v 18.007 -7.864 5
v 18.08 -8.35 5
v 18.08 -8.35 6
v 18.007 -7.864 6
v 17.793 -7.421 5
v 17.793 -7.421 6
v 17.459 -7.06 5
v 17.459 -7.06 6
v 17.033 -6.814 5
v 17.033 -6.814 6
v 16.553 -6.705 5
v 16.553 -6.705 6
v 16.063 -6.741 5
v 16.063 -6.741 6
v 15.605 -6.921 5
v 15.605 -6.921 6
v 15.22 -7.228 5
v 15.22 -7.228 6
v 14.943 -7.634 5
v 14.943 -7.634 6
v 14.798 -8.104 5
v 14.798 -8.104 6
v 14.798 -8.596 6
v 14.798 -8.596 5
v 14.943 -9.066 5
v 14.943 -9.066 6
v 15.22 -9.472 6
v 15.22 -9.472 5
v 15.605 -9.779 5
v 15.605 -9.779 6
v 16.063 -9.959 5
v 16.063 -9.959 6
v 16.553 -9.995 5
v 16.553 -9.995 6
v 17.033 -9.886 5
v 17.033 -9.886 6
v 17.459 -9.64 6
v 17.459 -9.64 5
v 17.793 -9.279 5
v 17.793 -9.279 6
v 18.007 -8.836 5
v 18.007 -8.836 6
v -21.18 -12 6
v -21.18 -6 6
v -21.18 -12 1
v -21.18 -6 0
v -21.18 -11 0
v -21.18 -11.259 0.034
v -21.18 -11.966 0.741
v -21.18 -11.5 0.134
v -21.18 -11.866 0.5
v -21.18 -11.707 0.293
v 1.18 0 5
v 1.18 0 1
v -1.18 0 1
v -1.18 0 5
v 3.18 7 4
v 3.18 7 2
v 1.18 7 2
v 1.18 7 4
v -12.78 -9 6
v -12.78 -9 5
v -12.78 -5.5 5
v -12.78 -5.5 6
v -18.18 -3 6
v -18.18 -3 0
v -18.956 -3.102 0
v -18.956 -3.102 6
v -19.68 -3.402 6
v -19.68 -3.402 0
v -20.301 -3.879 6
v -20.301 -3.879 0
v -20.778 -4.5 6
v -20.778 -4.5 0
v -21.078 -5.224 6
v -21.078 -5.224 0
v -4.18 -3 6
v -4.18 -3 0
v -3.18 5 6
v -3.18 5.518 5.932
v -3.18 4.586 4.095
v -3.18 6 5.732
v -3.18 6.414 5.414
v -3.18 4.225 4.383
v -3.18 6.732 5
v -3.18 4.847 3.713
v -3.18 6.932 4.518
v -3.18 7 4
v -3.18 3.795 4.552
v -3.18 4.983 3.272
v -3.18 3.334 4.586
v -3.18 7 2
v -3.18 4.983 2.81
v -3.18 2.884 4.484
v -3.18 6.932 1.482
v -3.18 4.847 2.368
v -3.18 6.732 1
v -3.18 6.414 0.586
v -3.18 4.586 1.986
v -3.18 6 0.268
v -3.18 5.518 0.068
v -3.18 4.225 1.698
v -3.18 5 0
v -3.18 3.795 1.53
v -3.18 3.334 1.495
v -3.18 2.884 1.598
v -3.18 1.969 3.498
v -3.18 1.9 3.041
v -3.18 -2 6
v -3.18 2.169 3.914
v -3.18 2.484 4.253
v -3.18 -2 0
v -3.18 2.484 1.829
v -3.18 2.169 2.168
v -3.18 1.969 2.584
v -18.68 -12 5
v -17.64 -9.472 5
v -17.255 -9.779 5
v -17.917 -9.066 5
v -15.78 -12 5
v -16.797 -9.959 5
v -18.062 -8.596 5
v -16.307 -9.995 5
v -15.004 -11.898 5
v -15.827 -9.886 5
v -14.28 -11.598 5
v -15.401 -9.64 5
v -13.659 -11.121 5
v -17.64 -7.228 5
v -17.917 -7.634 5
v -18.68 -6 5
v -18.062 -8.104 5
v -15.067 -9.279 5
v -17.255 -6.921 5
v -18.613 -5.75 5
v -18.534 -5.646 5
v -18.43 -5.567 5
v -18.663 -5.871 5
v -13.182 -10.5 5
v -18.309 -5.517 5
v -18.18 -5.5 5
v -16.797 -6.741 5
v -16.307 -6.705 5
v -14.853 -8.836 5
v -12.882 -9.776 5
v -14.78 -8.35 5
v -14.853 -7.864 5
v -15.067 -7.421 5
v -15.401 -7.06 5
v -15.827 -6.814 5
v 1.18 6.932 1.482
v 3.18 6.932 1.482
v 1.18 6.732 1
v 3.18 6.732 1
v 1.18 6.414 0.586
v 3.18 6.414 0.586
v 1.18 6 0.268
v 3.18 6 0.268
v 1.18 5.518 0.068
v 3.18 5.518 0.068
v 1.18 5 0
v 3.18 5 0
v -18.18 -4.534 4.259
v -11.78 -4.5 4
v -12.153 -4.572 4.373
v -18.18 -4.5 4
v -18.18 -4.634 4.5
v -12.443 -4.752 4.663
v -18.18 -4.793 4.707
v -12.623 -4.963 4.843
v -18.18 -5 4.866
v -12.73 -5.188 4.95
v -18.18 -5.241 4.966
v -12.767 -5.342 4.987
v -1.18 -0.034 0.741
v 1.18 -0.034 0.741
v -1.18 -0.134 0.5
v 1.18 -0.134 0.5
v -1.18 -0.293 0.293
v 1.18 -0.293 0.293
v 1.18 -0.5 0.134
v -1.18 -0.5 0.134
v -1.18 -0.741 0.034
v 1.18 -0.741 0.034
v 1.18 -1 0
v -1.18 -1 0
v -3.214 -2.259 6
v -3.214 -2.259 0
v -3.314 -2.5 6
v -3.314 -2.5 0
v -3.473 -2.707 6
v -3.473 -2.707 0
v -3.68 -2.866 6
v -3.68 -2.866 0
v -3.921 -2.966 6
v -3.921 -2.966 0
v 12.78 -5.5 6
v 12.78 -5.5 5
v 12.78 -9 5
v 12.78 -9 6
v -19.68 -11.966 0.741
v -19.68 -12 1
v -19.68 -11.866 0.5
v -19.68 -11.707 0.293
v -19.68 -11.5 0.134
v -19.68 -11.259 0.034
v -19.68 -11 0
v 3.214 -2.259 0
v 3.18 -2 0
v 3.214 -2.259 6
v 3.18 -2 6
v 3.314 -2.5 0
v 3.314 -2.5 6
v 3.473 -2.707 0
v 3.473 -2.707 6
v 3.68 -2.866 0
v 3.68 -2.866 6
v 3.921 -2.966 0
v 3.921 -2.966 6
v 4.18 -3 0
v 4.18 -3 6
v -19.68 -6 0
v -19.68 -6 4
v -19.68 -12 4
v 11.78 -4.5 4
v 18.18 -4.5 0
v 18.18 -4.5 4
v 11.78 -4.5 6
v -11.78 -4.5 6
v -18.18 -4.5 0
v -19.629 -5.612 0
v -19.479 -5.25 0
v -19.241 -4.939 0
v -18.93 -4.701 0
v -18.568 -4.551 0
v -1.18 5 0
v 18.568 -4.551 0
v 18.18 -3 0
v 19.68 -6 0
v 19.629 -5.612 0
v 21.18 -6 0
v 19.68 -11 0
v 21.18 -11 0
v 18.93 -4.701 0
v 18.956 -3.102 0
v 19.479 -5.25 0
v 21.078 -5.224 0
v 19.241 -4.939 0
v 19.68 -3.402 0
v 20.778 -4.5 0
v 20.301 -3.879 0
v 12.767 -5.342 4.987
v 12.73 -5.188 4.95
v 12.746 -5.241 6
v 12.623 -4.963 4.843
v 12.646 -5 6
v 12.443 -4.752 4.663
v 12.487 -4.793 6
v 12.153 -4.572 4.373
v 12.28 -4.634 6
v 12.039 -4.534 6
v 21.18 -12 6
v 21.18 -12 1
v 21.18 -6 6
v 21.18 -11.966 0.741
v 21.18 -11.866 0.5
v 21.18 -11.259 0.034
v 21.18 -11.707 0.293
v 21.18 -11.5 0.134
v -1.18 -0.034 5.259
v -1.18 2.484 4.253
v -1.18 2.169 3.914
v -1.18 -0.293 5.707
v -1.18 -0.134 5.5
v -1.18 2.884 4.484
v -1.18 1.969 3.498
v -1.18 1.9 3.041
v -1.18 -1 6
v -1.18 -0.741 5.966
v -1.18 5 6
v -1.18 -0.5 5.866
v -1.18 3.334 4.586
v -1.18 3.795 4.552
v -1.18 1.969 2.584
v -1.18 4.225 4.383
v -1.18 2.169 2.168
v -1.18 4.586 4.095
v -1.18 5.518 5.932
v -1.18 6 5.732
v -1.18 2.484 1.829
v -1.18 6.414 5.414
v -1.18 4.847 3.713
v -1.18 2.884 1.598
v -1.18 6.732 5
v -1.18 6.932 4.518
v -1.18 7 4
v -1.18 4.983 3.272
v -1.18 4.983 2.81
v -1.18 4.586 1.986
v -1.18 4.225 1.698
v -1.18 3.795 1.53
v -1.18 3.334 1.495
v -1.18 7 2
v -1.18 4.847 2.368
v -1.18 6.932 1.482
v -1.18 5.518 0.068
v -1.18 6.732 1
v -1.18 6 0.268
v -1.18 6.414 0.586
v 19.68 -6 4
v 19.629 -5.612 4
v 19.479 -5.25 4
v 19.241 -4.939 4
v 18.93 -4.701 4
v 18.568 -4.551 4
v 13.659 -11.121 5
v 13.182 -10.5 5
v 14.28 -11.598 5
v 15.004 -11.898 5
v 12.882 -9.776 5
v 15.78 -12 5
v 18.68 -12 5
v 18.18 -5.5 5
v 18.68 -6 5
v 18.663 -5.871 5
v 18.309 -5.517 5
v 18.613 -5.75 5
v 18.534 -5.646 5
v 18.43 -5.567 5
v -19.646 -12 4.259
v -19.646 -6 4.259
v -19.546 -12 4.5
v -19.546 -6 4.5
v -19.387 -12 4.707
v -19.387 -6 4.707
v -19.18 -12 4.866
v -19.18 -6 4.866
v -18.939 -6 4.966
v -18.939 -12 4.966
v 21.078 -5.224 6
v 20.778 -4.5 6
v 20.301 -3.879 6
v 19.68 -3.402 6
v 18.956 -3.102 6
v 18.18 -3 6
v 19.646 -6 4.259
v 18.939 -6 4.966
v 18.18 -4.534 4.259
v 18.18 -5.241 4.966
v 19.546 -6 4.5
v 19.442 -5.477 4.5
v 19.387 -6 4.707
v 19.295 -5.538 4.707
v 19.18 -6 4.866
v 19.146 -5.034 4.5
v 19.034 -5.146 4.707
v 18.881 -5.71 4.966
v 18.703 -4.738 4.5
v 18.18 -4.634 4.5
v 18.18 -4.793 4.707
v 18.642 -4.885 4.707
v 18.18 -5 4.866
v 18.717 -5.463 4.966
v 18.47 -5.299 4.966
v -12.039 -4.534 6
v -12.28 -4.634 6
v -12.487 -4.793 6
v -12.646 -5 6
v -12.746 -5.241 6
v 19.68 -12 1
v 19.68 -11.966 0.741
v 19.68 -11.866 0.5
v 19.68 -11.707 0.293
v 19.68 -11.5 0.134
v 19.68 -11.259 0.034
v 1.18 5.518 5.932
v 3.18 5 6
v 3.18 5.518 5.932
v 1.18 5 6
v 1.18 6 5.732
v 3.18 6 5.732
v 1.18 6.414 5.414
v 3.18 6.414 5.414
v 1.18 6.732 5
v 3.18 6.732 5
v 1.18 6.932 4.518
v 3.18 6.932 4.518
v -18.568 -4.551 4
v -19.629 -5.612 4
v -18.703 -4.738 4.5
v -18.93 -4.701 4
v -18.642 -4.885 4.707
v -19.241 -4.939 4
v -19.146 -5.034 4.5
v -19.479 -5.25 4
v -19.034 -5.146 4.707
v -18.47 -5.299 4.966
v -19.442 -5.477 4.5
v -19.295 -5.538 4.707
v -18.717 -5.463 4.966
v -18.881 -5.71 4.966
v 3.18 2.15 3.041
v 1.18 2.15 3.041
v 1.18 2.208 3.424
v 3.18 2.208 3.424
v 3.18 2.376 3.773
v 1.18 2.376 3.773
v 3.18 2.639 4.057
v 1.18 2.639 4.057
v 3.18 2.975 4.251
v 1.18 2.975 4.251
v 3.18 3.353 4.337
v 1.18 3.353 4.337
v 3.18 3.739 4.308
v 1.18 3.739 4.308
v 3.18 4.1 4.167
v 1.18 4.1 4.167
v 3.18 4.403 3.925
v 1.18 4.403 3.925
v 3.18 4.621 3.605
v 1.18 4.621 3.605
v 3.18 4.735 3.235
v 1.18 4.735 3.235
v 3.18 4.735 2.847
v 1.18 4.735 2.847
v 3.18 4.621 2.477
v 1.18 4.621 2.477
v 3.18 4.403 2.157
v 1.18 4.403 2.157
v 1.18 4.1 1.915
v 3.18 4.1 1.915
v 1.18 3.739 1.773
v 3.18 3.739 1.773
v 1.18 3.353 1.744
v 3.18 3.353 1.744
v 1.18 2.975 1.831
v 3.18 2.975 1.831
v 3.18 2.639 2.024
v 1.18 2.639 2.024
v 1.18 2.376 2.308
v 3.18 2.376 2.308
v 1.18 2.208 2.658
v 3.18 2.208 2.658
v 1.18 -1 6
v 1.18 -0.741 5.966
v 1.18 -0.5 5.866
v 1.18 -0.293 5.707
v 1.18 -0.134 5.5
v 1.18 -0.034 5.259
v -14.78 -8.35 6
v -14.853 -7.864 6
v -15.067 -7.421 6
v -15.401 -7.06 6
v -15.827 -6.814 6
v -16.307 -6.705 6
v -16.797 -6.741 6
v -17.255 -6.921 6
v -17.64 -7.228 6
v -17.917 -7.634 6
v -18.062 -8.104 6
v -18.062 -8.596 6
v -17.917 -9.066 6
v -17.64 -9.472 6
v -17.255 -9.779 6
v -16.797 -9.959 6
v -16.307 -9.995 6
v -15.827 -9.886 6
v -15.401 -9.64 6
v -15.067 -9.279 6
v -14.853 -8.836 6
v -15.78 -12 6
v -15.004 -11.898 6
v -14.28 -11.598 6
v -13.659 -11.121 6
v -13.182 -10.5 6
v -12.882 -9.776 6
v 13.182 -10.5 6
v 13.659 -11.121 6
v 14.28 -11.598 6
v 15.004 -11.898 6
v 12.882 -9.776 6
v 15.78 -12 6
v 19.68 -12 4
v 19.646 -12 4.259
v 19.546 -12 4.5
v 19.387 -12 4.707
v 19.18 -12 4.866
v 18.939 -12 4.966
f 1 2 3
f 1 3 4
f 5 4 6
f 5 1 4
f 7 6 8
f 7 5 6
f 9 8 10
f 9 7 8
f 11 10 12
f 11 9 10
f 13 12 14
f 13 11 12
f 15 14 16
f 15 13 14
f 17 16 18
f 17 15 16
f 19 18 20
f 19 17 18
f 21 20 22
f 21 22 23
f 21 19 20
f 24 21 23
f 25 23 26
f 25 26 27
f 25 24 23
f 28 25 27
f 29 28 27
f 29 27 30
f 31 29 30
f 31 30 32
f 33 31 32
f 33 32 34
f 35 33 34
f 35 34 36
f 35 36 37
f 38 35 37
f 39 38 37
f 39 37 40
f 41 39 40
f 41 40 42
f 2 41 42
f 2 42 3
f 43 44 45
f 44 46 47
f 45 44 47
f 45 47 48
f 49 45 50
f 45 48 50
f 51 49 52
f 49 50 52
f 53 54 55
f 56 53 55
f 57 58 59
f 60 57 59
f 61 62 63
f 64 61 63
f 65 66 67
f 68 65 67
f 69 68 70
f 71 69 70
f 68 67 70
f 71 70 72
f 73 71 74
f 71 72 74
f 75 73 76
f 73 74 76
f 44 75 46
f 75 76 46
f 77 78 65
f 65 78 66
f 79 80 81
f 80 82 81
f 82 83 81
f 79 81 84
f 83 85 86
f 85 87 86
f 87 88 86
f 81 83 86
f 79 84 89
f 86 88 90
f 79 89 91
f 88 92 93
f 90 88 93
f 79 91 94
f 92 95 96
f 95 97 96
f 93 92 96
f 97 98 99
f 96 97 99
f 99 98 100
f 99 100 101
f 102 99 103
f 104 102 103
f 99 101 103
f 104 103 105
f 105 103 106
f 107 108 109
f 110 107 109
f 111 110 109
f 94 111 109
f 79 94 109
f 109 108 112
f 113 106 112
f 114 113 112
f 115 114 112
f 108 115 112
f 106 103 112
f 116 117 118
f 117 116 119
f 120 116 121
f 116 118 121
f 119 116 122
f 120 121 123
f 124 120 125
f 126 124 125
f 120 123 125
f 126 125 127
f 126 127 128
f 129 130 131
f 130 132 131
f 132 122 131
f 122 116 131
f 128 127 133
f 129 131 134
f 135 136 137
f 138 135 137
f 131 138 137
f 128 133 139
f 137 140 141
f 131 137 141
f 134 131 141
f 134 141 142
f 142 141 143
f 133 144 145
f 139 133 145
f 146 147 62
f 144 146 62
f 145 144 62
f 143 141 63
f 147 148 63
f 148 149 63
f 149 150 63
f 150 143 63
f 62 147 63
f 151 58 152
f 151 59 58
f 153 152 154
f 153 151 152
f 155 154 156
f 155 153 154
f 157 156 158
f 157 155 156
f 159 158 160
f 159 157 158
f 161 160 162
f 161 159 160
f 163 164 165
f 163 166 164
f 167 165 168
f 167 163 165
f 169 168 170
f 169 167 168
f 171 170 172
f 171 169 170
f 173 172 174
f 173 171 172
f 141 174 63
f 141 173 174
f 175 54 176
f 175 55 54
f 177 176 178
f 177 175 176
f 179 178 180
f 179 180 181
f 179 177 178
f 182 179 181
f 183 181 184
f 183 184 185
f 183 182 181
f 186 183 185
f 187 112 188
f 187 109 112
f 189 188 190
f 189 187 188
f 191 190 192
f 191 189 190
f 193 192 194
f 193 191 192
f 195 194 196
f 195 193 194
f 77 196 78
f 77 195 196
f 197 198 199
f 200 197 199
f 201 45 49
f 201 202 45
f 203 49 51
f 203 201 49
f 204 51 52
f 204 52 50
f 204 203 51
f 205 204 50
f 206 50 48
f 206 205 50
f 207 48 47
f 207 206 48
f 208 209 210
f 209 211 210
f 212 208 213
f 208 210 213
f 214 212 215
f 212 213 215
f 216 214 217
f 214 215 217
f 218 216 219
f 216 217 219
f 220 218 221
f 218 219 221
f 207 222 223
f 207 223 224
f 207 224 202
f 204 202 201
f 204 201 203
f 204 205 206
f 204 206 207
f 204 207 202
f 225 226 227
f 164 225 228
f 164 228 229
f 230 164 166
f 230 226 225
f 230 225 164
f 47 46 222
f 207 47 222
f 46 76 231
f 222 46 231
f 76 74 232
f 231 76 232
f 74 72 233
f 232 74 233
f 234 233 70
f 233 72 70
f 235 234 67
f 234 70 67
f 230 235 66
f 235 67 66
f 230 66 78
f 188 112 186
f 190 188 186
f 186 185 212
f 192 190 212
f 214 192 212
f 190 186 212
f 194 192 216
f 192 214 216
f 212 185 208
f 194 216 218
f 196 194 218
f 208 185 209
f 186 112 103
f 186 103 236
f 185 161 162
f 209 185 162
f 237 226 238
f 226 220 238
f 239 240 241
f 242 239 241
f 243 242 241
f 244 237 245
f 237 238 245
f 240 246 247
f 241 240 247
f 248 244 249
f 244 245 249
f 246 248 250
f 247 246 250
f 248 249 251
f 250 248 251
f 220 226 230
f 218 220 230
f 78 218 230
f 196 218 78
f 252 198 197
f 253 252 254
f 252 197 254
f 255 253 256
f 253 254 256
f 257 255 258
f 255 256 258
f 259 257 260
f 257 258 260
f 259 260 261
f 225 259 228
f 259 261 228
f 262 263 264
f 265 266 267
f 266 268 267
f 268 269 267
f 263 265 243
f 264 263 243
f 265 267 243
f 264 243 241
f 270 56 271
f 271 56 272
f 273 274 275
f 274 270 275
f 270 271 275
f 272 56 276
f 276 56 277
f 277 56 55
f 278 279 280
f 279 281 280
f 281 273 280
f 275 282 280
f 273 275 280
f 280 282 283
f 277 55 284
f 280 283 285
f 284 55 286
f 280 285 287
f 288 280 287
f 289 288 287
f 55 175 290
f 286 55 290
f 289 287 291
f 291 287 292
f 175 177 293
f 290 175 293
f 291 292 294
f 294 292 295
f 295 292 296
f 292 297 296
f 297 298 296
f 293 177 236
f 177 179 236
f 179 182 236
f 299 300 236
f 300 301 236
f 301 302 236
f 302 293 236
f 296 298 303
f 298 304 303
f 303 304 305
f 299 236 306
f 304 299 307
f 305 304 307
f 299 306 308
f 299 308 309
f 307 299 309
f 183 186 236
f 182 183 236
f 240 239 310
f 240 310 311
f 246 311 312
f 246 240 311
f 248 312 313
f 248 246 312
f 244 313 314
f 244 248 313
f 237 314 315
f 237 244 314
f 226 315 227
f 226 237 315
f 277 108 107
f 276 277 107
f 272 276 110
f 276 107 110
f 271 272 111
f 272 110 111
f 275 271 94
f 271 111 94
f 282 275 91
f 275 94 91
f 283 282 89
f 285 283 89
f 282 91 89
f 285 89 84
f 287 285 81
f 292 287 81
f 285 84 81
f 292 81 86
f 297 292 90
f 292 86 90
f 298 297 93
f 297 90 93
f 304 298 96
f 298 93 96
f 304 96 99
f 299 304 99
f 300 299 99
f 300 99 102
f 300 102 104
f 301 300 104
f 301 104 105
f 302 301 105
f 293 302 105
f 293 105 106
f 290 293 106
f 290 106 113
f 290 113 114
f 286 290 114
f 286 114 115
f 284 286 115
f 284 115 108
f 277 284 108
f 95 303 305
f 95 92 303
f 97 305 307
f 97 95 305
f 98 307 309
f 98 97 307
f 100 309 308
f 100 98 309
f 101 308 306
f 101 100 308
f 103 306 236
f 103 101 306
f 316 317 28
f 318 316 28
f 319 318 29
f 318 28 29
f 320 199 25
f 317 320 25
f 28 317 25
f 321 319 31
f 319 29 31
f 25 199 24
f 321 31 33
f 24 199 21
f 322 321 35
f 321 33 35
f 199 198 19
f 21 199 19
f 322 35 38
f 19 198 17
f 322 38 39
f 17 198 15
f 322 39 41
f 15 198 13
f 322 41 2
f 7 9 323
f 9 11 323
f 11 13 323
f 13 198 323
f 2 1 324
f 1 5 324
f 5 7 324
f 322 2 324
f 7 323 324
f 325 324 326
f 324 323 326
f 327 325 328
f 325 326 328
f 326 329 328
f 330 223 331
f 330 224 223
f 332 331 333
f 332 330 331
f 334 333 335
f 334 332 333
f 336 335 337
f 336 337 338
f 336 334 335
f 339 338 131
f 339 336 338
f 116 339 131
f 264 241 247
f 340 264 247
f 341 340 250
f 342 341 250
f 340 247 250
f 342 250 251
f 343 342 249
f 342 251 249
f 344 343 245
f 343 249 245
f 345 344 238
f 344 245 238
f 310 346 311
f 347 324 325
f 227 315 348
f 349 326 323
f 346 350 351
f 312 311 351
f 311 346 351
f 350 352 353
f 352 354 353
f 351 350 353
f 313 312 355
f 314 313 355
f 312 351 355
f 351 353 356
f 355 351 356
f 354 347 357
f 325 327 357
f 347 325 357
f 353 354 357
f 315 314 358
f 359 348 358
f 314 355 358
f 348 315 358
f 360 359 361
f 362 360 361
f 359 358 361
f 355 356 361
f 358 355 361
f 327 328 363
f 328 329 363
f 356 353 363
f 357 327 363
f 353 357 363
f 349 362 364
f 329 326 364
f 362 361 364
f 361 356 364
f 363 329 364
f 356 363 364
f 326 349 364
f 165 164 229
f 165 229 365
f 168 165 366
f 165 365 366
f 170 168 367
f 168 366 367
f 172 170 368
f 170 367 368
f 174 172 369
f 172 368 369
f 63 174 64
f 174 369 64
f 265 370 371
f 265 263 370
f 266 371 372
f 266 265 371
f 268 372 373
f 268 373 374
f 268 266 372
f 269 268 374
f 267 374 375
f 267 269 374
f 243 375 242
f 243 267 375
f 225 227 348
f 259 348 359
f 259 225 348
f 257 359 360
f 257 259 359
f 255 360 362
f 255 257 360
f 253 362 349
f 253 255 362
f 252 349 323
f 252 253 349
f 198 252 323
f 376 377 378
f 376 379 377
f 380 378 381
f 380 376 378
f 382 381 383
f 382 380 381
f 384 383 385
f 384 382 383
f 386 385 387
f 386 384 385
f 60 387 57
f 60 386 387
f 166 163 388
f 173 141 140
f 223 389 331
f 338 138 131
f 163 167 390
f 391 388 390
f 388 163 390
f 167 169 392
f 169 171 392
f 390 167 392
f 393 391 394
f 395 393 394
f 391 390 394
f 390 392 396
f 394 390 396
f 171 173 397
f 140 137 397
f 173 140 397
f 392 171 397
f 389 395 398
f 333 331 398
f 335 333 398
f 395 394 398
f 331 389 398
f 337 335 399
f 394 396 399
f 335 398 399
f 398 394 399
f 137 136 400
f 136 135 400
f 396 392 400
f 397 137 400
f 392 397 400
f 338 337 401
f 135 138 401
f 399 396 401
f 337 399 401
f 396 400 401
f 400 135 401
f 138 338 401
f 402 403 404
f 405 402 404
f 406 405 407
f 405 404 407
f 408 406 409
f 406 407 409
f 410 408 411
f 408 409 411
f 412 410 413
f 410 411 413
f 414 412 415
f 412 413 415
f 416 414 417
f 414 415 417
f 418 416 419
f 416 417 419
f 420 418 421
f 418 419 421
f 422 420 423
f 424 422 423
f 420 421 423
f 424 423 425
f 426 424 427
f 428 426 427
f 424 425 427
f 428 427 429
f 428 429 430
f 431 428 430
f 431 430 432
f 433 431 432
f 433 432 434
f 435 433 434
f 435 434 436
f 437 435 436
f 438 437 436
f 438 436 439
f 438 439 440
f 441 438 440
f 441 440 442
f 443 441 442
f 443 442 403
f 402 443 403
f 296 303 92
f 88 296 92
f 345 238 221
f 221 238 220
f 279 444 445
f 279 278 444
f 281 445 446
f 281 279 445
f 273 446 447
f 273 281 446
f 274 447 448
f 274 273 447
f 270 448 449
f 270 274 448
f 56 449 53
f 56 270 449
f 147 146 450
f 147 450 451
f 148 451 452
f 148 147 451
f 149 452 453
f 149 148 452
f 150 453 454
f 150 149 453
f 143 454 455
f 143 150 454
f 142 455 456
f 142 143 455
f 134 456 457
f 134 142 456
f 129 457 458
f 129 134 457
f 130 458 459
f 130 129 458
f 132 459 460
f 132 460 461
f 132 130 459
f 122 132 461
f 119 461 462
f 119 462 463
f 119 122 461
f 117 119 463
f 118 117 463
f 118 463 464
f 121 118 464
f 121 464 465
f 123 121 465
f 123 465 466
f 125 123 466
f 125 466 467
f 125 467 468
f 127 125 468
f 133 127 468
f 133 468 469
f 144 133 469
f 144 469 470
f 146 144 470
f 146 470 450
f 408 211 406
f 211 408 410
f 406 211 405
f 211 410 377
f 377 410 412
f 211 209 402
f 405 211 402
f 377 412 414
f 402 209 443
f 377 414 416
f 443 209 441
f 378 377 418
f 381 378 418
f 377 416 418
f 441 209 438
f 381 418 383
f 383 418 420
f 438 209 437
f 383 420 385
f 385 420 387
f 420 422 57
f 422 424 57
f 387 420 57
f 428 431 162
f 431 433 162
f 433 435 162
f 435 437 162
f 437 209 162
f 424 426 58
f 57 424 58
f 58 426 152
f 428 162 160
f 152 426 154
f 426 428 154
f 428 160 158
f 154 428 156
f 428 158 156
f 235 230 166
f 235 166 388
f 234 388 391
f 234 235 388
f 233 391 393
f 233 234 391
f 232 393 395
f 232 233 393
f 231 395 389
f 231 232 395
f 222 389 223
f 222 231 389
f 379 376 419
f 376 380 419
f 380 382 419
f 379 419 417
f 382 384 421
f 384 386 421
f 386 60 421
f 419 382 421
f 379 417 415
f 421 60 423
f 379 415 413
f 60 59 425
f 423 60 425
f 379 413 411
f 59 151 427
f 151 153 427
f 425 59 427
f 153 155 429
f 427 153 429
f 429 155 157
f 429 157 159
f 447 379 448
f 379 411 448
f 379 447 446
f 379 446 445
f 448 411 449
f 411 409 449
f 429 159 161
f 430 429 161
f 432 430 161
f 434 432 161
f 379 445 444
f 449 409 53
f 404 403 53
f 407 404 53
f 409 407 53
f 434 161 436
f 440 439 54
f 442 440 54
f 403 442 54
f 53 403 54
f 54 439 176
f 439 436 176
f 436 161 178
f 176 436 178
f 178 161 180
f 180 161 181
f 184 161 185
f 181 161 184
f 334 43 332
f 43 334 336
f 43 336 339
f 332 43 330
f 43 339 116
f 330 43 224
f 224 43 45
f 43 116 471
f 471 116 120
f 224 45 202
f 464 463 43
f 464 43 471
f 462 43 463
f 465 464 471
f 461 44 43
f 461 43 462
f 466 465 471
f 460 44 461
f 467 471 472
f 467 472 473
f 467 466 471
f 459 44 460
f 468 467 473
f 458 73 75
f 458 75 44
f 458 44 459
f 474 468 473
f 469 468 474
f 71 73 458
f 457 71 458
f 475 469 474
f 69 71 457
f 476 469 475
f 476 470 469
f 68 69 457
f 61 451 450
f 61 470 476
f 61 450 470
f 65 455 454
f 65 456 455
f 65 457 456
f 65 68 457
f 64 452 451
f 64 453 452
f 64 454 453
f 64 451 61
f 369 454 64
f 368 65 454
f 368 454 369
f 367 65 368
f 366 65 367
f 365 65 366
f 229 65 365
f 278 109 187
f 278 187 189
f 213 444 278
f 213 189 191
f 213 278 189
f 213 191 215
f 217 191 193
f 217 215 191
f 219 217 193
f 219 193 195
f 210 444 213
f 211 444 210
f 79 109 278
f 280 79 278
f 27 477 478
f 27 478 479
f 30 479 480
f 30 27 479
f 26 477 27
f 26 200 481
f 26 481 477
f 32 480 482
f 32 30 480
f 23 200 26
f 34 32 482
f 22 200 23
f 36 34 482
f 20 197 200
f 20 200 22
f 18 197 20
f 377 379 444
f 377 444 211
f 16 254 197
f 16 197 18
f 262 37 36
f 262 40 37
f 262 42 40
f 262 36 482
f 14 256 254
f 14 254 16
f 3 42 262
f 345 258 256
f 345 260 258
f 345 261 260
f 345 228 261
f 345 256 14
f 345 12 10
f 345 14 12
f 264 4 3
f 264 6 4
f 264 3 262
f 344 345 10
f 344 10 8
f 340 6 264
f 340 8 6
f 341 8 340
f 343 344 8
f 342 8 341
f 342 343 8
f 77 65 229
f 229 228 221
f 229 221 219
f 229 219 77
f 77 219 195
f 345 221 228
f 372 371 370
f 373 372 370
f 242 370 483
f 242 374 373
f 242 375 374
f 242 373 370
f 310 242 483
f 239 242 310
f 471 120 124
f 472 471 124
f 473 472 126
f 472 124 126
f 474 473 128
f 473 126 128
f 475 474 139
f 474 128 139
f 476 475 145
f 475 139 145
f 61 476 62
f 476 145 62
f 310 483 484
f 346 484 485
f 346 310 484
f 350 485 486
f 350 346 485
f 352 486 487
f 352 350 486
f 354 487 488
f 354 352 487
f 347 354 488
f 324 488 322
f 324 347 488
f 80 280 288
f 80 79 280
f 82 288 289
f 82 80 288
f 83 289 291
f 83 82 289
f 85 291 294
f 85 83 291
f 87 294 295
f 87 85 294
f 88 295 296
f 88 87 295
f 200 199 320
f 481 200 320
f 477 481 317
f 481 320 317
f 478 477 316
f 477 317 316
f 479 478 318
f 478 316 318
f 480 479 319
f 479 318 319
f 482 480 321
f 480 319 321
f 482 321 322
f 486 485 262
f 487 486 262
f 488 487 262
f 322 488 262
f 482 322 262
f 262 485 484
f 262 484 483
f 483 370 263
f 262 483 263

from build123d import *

# Parameters (mm, degrees)
F0_R     = 1.65
F1_DEPTH = 6
F2_DEPTH = 5
F4_R     = 2
F3_R     = 1.3
F5_DEPTH = 7
F3_R_2   = 1.55
F6_DEPTH = 3
F7_R     = 1


with BuildPart() as f1:
    # F0 (on Top) → F1 (new body)
    with BuildSketch(Plane.XY):
        with BuildLine():
            Line((1.18, 0), (0, 0))
            Line((0, 0), (-1.18, 0))
            Line((-1.18, 0), (-1.18, 7))
            Line((-1.18, 7), (-3.18, 7))
            Line((-3.18, 7), (-3.18, 0))
            Line((-3.18, 0), (-3.18, -3))
            Line((-3.18, -3), (-18.18, -3))
            ThreePointArc((-18.18, -3), (-20.3013203436, -3.8786796564), (-21.18, -6))
            Line((-21.18, -6), (-21.18, -12))
            Line((-21.18, -12), (-19.68, -12))
            Line((-19.68, -12), (-19.68, -6))
            ThreePointArc((-19.68, -6), (-19.2406601718, -4.9393398282), (-18.18, -4.5))
            Line((-18.18, -4.5), (-12.78, -4.5))
            Line((-12.78, -4.5), (0, -4.5))
            Line((0, -4.5), (12.78, -4.5))
            Line((12.78, -4.5), (18.18, -4.5))
            ThreePointArc((18.18, -4.5), (19.2406601718, -4.9393398282), (19.68, -6))
            Line((19.68, -6), (19.68, -12))
            Line((19.68, -12), (21.18, -12))
            Line((21.18, -12), (21.18, -6))
            ThreePointArc((21.18, -6), (20.3013203436, -3.8786796564), (18.18, -3))
            Line((18.18, -3), (3.18, -3))
            Line((3.18, -3), (3.18, 0))
            Line((3.18, 0), (3.18, 7))
            Line((3.18, 7), (1.18, 7))
            Line((1.18, 7), (1.18, 0))
        make_face()
        with BuildLine():
            Line((15.78, -12), (19.68, -12))
            Line((19.68, -12), (19.68, -6))
            ThreePointArc((19.68, -6), (19.2406601718, -4.9393398282), (18.18, -4.5))
            Line((18.18, -4.5), (12.78, -4.5))
            Line((12.78, -4.5), (12.78, -9))
            ThreePointArc((12.78, -9), (13.6586796564, -11.1213203436), (15.78, -12))
        make_face()
        with Locations((16.43, -8.35)):
            Circle(F0_R, mode=Mode.SUBTRACT)
        with BuildLine():
            Line((-19.68, -6), (-19.68, -12))
            Line((-19.68, -12), (-15.78, -12))
            ThreePointArc((-15.78, -12), (-13.6586796564, -11.1213203436), (-12.78, -9))
            Line((-12.78, -9), (-12.78, -4.5))
            Line((-12.78, -4.5), (-18.18, -4.5))
            ThreePointArc((-18.18, -4.5), (-19.2406601718, -4.9393398282), (-19.68, -6))
        make_face()
        with Locations((-16.43, -8.35)):
            Circle(F0_R, mode=Mode.SUBTRACT)
    extrude(amount=F1_DEPTH)

    # F0 (on Top) → F2 (cut)
    with BuildSketch(Plane.XY):
        with BuildLine():
            Line((-19.68, -6), (-19.68, -12))
            Line((-19.68, -12), (-15.78, -12))
            ThreePointArc((-15.78, -12), (-13.6586796564, -11.1213203436), (-12.78, -9))
            Line((-12.78, -9), (-12.78, -4.5))
            Line((-12.78, -4.5), (-18.18, -4.5))
            ThreePointArc((-18.18, -4.5), (-19.2406601718, -4.9393398282), (-19.68, -6))
        make_face()
        with Locations((-16.43, -8.35)):
            Circle(F0_R, mode=Mode.SUBTRACT)
        with BuildLine():
            Line((15.78, -12), (19.68, -12))
            Line((19.68, -12), (19.68, -6))
            ThreePointArc((19.68, -6), (19.2406601718, -4.9393398282), (18.18, -4.5))
            Line((18.18, -4.5), (12.78, -4.5))
            Line((12.78, -4.5), (12.78, -9))
            ThreePointArc((12.78, -9), (13.6586796564, -11.1213203436), (15.78, -12))
        make_face()
        with Locations((16.43, -8.35)):
            Circle(F0_R, mode=Mode.SUBTRACT)
    extrude(amount=F2_DEPTH, mode=Mode.SUBTRACT)

    # F4
    f4_edges = [f1.edges().sort_by_distance(p)[0] for p in [
        (-2.18, 7, 6),
        (2.18, 7, 6),
        (2.18, 7, 0),
        (-2.18, 7, 0),
    ]]
    fillet(f4_edges, radius=F4_R)

    # F3 (on face) → F5 (cut)
    with BuildSketch(Plane(origin=(-3.18, 0, 0), x_dir=(0, -1, 0), z_dir=(-1, 0, 0))):
        with Locations((-3.45, 3.0407507438)):
            Circle(F3_R)
    extrude(amount=-F5_DEPTH, mode=Mode.SUBTRACT)

    # F3 (on face) → F6 (cut)
    with BuildSketch(Plane(origin=(-3.18, 0, 0), x_dir=(0, -1, 0), z_dir=(-1, 0, 0))):
        with Locations((-3.45, 3.0407507438)):
            Circle(F3_R_2)
        with Locations((-3.45, 3.0407507438)):
            Circle(F3_R, mode=Mode.SUBTRACT)
    extrude(amount=-F6_DEPTH, mode=Mode.SUBTRACT)

    # F7
    f7_edges = [f1.edges().sort_by_distance(p)[0] for p in [
        (-19.68, -9, 5),
        (15.48, -4.5, 5),
        (12.78, -4.5, 5.5),
        (-12.78, -4.5, 5.5),
        (-20.43, -12, 0),
        (20.43, -12, 0),
        (3.18, -3, 3),
        (-3.18, -3, 3),
        (0, 0, 6),
        (0, 0, 0),
    ]]
    fillet(f7_edges, radius=F7_R)


solid = f1.part
